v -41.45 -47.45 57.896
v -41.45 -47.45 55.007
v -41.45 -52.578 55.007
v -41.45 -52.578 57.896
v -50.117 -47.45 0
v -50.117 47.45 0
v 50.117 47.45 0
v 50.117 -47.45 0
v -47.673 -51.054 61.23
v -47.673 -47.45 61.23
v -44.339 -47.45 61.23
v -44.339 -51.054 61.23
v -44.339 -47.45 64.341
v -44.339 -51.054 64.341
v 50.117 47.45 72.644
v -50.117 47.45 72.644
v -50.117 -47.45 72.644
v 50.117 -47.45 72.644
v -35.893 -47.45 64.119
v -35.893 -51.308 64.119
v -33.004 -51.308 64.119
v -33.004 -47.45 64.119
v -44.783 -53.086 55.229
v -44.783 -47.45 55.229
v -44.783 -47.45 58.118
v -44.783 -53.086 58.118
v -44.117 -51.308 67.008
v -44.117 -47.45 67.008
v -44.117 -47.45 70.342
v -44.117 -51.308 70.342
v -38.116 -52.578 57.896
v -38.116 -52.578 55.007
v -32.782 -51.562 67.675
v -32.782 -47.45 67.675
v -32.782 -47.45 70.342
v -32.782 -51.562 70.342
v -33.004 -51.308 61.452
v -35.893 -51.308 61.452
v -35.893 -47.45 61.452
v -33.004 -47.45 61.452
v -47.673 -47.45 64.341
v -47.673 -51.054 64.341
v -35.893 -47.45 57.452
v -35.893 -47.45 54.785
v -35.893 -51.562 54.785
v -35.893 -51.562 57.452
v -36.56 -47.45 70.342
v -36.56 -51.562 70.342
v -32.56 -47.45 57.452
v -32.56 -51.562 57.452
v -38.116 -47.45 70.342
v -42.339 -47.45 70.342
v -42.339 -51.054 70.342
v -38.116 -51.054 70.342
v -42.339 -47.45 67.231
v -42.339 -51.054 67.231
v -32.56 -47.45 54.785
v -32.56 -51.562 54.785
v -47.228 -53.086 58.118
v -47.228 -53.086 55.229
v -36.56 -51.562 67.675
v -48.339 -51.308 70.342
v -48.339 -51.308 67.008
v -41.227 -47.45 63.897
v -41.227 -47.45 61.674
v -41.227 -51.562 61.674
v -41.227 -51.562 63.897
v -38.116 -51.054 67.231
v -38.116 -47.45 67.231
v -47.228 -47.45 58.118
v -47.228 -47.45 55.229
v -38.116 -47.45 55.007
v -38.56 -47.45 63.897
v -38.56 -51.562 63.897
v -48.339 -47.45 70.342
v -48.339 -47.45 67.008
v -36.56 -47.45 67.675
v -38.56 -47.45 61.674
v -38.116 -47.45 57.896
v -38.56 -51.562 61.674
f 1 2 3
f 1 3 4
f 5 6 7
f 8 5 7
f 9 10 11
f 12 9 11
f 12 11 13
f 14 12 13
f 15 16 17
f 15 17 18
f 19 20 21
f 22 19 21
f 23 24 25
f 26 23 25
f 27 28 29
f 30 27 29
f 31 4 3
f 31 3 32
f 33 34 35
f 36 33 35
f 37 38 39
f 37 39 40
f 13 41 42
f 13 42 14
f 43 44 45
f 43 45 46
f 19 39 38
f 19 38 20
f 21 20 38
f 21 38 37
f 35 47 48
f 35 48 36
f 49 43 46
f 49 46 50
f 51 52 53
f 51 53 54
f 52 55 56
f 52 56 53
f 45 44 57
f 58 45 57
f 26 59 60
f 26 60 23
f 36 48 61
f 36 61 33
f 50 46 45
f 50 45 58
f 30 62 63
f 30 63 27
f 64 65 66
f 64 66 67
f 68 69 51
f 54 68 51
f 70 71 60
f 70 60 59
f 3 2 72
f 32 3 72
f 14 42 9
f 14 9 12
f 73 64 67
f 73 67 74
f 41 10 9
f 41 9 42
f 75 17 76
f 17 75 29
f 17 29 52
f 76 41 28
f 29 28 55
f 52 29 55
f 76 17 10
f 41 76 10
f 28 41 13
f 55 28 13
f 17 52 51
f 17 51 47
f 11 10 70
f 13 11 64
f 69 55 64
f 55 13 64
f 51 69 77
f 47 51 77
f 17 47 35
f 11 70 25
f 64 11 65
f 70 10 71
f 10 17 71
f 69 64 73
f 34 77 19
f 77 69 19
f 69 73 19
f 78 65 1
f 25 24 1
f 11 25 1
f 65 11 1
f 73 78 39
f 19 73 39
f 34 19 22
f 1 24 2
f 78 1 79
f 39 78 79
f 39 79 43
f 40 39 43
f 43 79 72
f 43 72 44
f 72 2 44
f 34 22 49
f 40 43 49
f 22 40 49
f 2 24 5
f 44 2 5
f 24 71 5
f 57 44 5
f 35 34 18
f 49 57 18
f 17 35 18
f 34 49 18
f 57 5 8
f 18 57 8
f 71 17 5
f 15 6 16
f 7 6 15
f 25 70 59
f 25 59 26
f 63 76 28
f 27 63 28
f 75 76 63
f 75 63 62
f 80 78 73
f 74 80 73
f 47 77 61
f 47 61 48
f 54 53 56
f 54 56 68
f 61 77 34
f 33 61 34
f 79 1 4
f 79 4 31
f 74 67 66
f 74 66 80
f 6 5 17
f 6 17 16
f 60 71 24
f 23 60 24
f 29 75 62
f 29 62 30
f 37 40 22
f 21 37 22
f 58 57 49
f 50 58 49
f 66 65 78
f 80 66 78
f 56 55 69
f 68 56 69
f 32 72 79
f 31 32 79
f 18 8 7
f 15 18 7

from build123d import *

# Parameters (mm, degrees)
F0_W      = 100.234754
F0_H      = 94.90075
F1_DEPTH  = 72.644
F2_W      = 4.22275
F2_H      = 3.333748
F3_DEPTH  = 51.308
F4_W      = 4.222751
F4_H      = 3.111497
F5_DEPTH  = 51.054
F6_W      = 3.778249
F6_H      = 2.666995
F7_DEPTH  = 51.562
F8_W      = 3.333751
F8_H      = 3.111497
F9_DEPTH  = 51.054
F10_W     = 2.666998
F10_H     = 2.222497
F11_DEPTH = 51.562
F12_W     = 2.889253
F12_H     = 2.666999
F13_DEPTH = 51.308
F14_W     = 2.444748
F14_H     = 2.889249
F15_DEPTH = 53.086
F16_W     = 3.333751
F16_H     = 2.889249
F17_DEPTH = 52.578
F18_W     = 3.333751
F18_H     = 2.666998
F19_DEPTH = 51.562


with BuildPart() as f1:
    # F0 (on Top) → F1 (new body)
    with BuildSketch(Plane.XY):
        Rectangle(F0_W, F0_H)
    extrude(amount=F1_DEPTH)

    # F2 (on Front) → F3 (join)
    with BuildSketch(Plane.XZ):
        with Locations((-46.227999, 68.67525)):
            Rectangle(F2_W, F2_H)
    extrude(amount=F3_DEPTH)

    # F4 (on Front) → F5 (join)
    with BuildSketch(Plane.XZ):
        with Locations((-40.227249, 68.786375)):
            Rectangle(F4_W, F4_H)
    extrude(amount=F5_DEPTH)

    # F6 (on Front) → F7 (join)
    with BuildSketch(Plane.XZ):
        with Locations((-34.671002, 69.008626)):
            Rectangle(F6_W, F6_H)
    extrude(amount=F7_DEPTH)

    # F8 (on Front) → F9 (join)
    with BuildSketch(Plane.XZ):
        with Locations((-46.00575, 62.785625)):
            Rectangle(F8_W, F8_H)
    extrude(amount=F9_DEPTH)

    # F10 (on Front) → F11 (join)
    with BuildSketch(Plane.XZ):
        with Locations((-39.893875, 62.785623)):
            Rectangle(F10_W, F10_H)
    extrude(amount=F11_DEPTH)

    # F12 (on Front) → F13 (join)
    with BuildSketch(Plane.XZ):
        with Locations((-34.448751, 62.785623)):
            Rectangle(F12_W, F12_H)
    extrude(amount=F13_DEPTH)

    # F14 (on Front) → F15 (join)
    with BuildSketch(Plane.XZ):
        with Locations((-46.00575, 56.673749)):
            Rectangle(F14_W, F14_H)
    extrude(amount=F15_DEPTH)

    # F16 (on Front) → F17 (join)
    with BuildSketch(Plane.XZ):
        with Locations((-39.782749, 56.451501)):
            Rectangle(F16_W, F16_H)
    extrude(amount=F17_DEPTH)

    # F18 (on Front) → F19 (join)
    with BuildSketch(Plane.XZ):
        with Locations((-34.226501, 56.118125)):
            Rectangle(F18_W, F18_H)
    extrude(amount=F19_DEPTH)


solid = f1.part
